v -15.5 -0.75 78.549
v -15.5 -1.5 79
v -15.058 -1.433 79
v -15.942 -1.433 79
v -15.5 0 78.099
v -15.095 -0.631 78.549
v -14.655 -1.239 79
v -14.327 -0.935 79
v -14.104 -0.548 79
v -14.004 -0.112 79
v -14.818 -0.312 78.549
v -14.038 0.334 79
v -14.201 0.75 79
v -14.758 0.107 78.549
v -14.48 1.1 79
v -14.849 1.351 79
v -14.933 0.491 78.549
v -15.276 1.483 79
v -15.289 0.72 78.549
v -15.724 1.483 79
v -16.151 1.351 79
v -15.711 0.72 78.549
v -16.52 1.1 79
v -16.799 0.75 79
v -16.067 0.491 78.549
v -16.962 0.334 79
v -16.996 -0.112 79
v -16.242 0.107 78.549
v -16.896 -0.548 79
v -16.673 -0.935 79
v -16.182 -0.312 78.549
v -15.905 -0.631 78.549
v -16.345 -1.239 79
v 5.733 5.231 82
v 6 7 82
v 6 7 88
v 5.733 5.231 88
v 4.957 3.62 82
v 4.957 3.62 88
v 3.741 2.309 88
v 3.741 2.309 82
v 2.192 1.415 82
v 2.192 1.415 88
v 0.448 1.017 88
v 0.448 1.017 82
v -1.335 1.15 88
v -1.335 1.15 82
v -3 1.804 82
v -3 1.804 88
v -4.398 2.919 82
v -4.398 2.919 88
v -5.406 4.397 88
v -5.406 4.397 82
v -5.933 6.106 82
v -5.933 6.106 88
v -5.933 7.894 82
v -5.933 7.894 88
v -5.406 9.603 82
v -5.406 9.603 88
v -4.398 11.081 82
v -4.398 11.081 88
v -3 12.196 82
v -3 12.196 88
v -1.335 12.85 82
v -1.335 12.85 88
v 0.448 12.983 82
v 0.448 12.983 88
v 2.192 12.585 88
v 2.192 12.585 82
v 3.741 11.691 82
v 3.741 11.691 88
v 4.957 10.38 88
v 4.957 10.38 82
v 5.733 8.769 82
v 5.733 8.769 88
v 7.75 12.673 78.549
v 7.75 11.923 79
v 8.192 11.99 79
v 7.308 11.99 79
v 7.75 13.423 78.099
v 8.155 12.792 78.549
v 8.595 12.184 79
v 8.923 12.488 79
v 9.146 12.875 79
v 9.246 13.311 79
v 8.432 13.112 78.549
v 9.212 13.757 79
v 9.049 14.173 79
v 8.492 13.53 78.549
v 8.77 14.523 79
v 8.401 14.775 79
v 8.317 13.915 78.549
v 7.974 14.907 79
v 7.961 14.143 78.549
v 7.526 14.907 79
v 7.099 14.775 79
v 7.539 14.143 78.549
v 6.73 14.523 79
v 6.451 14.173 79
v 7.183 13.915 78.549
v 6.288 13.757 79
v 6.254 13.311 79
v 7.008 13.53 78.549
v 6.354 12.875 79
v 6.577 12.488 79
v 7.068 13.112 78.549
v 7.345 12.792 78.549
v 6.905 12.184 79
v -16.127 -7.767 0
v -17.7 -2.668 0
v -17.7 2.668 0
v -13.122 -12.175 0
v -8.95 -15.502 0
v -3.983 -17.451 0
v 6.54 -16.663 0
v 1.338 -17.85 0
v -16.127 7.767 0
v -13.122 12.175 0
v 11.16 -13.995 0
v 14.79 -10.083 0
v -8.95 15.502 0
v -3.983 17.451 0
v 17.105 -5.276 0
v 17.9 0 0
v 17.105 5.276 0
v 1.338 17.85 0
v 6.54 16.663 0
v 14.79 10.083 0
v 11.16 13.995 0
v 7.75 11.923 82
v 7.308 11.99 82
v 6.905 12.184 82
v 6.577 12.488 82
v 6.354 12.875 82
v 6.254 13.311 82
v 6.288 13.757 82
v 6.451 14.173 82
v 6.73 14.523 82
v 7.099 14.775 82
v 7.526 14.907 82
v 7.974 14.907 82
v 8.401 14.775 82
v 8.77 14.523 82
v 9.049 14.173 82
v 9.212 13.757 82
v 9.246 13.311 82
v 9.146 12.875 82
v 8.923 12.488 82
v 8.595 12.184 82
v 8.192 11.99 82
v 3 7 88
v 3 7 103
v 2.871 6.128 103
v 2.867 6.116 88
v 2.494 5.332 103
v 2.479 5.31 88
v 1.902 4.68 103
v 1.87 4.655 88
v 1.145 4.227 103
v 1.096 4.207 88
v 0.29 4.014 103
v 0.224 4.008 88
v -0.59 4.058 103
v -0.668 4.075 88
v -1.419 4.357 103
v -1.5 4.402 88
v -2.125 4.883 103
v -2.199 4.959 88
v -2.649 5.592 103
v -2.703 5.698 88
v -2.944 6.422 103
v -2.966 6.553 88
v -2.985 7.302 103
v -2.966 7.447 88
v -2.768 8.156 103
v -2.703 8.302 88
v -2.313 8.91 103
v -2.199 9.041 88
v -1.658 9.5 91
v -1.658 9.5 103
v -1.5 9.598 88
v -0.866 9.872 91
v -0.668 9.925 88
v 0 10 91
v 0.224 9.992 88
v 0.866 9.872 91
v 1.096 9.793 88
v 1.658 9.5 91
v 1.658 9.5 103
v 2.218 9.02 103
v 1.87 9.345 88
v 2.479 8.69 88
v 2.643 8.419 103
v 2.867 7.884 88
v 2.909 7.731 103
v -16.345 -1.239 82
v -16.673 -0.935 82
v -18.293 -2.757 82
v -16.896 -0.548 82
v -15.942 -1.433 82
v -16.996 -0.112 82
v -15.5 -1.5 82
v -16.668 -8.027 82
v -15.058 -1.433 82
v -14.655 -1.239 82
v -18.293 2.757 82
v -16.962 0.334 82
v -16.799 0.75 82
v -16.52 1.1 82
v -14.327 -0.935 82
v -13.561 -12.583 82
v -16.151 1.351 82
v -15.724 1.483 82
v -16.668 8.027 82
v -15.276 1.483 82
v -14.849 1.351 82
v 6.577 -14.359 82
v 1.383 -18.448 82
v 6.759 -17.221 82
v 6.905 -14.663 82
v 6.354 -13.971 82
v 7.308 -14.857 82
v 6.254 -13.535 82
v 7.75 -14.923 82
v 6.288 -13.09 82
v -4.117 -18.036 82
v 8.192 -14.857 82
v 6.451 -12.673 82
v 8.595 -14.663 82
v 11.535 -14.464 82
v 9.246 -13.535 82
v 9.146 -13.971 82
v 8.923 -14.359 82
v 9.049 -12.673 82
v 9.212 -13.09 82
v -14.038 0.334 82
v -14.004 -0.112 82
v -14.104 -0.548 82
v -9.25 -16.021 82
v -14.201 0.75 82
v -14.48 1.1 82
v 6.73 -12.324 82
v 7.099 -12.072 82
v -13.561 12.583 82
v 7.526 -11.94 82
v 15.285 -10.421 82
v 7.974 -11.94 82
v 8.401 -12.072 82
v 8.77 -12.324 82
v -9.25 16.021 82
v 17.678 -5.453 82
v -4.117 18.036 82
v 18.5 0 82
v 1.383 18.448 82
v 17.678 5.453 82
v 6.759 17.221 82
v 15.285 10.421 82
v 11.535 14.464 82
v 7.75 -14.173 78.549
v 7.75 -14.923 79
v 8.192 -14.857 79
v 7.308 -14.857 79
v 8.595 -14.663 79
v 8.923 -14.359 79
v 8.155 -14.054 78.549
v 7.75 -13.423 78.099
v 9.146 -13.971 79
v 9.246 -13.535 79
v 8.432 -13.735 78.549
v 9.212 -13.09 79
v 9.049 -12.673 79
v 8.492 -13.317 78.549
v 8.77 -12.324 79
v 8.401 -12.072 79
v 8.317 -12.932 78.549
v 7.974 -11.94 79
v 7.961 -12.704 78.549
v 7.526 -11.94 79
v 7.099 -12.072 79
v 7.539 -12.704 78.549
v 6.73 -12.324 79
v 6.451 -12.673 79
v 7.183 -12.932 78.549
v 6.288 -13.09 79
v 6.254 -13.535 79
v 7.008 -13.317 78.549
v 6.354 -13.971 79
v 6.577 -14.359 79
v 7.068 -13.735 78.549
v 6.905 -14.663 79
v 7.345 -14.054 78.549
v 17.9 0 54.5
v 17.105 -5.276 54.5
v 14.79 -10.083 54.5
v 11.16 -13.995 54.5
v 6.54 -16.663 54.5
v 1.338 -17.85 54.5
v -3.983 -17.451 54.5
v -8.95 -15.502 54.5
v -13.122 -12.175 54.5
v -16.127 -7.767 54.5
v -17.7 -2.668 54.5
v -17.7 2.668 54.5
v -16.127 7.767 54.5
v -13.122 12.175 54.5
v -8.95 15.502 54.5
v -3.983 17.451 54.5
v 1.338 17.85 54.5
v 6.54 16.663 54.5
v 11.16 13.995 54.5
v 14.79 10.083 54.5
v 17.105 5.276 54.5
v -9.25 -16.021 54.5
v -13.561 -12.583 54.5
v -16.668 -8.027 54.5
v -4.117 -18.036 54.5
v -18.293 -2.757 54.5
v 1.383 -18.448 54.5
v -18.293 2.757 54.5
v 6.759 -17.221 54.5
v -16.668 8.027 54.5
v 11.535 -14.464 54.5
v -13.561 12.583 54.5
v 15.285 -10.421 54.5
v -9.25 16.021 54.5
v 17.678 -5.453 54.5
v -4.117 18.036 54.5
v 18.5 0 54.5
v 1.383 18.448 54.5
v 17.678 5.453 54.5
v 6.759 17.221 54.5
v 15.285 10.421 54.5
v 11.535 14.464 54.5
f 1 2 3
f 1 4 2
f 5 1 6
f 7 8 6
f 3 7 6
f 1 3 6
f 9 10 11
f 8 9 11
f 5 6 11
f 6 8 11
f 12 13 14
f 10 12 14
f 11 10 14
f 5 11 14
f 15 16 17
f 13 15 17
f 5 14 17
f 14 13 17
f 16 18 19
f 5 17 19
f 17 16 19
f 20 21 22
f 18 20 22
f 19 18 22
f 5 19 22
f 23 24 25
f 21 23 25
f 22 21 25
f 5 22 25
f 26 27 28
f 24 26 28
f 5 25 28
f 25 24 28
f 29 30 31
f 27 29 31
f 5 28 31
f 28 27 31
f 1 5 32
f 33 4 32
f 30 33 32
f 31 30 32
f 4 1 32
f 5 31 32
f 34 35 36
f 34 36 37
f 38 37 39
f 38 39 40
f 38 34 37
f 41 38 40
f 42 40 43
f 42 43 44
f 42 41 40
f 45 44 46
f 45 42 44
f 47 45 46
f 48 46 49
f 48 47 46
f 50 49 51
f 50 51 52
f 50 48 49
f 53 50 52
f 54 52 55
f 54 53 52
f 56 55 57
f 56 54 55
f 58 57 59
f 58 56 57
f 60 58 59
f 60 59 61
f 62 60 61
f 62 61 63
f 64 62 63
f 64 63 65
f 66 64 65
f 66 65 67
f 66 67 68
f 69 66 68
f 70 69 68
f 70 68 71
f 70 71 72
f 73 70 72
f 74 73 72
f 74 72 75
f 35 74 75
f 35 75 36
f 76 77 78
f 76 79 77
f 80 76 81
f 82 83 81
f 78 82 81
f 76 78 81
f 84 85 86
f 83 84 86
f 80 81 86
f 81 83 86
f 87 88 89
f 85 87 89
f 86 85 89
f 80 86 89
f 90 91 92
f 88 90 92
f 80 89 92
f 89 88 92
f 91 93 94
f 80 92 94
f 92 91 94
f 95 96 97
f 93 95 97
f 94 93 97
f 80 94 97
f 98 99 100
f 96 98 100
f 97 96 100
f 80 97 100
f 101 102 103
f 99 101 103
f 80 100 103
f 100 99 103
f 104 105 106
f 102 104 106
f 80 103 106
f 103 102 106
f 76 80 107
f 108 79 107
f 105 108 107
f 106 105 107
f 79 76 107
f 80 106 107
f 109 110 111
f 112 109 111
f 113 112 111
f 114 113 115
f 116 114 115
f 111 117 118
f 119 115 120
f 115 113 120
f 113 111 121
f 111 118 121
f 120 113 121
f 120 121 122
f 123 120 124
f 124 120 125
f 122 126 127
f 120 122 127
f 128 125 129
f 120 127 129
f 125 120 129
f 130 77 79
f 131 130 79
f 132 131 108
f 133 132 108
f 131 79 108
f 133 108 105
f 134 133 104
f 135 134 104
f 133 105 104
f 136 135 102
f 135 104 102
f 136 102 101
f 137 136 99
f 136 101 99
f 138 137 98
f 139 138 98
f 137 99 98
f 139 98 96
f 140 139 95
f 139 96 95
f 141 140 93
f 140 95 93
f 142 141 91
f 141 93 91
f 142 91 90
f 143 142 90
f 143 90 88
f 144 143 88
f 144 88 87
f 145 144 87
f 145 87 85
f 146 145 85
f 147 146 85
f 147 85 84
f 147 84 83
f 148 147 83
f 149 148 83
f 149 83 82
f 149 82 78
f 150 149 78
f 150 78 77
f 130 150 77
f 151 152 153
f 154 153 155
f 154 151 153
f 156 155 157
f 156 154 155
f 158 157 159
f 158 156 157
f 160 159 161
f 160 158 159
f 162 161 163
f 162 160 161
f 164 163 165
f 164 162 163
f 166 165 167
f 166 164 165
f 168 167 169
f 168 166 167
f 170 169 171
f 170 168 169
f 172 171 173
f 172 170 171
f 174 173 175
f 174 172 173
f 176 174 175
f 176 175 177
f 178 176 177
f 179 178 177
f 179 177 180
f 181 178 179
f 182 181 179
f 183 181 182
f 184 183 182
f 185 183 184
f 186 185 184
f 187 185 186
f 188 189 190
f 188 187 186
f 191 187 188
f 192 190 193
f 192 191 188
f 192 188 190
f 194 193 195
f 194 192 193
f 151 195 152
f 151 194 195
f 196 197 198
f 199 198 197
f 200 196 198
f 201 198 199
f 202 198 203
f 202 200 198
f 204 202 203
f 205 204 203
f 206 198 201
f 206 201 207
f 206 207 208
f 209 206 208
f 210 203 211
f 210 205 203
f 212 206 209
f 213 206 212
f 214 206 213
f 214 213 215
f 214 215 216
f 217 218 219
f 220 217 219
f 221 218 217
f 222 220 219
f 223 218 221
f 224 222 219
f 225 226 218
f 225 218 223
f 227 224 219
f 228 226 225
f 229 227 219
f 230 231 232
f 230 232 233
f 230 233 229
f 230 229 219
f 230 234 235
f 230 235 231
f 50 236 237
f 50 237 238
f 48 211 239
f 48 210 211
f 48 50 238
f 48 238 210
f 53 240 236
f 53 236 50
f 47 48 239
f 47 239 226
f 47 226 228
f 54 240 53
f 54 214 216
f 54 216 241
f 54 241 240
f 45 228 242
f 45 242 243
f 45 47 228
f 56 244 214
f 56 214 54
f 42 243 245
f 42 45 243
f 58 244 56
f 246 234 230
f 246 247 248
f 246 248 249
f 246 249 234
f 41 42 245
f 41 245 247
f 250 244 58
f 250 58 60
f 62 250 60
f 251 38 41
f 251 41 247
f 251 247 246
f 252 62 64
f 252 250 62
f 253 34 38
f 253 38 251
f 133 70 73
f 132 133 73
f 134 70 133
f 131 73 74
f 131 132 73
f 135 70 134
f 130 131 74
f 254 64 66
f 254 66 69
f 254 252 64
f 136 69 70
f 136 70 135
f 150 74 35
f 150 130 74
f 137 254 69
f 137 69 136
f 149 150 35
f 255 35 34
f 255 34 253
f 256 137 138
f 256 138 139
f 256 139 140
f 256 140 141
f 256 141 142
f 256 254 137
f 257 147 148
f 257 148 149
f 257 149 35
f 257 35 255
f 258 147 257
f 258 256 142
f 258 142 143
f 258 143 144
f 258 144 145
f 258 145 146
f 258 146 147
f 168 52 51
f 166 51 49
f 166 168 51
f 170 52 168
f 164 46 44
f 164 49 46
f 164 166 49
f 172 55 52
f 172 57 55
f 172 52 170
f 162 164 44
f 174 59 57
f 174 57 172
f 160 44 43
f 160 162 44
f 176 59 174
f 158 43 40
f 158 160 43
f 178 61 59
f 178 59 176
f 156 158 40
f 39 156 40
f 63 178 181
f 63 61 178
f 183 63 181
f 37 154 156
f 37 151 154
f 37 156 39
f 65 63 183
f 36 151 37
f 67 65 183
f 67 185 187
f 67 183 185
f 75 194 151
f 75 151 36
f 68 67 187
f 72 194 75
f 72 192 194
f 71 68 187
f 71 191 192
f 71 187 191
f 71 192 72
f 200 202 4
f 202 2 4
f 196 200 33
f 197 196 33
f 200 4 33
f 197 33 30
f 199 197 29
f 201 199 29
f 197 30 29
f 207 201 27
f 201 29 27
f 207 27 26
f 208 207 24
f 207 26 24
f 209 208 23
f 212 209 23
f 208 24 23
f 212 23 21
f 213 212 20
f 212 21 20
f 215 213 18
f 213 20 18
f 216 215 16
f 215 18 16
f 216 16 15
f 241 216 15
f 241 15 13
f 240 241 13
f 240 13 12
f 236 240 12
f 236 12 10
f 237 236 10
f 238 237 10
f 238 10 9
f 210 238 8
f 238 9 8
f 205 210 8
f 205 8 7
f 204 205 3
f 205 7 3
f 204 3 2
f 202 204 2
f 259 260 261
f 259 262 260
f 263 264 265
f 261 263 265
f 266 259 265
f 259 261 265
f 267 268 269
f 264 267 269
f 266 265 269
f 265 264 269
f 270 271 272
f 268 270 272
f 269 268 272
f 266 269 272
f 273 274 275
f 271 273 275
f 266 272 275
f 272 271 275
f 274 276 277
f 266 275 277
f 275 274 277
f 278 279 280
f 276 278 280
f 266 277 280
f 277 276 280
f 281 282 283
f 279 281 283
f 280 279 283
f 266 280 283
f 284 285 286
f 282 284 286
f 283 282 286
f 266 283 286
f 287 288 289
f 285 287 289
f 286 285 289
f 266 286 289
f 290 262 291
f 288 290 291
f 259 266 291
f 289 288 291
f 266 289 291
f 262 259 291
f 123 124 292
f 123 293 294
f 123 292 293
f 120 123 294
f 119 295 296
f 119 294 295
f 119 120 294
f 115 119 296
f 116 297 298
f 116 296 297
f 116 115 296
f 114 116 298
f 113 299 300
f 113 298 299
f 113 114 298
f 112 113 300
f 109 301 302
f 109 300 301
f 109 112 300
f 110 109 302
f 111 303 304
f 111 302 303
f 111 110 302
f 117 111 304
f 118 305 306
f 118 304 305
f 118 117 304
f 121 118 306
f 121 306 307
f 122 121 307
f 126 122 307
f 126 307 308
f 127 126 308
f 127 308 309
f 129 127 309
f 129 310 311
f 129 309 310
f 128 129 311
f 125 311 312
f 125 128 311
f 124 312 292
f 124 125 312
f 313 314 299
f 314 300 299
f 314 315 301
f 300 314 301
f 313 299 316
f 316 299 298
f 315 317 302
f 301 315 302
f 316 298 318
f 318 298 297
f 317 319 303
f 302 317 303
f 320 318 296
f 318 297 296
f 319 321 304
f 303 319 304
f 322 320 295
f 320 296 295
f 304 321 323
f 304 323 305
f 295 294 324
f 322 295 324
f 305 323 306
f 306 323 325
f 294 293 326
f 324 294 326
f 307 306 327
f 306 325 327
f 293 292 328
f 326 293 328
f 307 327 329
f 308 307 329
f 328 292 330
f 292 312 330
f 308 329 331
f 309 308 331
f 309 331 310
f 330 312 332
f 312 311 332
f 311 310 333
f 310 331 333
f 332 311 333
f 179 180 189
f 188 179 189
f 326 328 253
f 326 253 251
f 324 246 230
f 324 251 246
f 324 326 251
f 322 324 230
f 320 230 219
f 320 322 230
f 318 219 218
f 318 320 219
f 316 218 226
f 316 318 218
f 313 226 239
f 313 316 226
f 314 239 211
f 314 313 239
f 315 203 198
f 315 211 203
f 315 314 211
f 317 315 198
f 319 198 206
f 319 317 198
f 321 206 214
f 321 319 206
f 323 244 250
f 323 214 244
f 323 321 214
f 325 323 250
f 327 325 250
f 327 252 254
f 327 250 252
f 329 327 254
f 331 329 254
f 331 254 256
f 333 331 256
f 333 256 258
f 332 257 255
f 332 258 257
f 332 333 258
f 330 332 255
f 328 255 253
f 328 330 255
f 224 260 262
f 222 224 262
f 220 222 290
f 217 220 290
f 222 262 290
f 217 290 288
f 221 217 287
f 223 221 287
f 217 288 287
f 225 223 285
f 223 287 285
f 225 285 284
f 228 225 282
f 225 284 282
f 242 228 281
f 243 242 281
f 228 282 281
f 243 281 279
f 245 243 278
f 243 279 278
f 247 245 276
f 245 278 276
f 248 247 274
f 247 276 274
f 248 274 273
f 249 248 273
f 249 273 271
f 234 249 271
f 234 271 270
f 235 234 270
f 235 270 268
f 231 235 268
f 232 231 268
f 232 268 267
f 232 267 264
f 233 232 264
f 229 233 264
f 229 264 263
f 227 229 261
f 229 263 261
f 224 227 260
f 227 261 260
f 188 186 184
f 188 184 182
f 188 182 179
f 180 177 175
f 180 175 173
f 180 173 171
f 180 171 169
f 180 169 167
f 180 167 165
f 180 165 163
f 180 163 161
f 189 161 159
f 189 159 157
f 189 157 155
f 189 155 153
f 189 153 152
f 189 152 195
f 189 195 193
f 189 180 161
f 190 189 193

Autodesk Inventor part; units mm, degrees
ref_plane "YZ Plane" through (0, 0, 0) normal (1, 0, 0) x (0, 1, 0)
ref_plane "XZ Plane" through (0, 0, 0) normal (0, 1, 0) x (-1, 0, 0)
ref_plane "XY Plane" through (0, 0, 0) normal (0, 0, 1) x (1, 0, 0)
sketch "スケッチ1" plane through (0, 0, 0) normal (0, 0, 1) x (1, 0, 0)
  circle A0 centre (0, 0) radius 17.9
  dimension "d0" = 35.8
extrude "押し出し1" add sketch "スケッチ1" along normal blind 54.5
sketch "スケッチ2" plane through (0, 0, 54.5) normal (0, 0, 1) x (1, 0, 0)
  circle A0 centre (0, 0) radius 17.9 projected
  circle A1 centre (0, 0) radius 18.5
  dimension "d3" = 37
extrude "押し出し2" add sketch "スケッチ2" along normal blind 27.5 contours A0 | A1
sketch "スケッチ3" plane through (0, 0, 82) normal (0, 0, 1) x (1, 0, 0)
  circle A0 centre (0, 0) radius 18.5 projected
  line L0 (0, 0) -> (0, 7)
  circle A1 centre (0, 7) radius 6
  dimension "d6" = 7
  dimension "d7" = 12
extrude "押し出し3" add sketch "スケッチ3" along normal blind 6 contours A1
sketch "スケッチ4" plane through (0, 7, 88) normal (0, 0, 1) x (1, 0, 0)
  circle A0 centre (0, 0) radius 6 projected
  circle A1 centre (0, 0) radius 3
  point P0 (0, -7)
  dimension "d10" = 6
extrude "押し出し4" add sketch "スケッチ4" along normal blind 15 contours A1
sketch "スケッチ5" plane through (0, 7, 103) normal (0, 0, 1) x (1, 0, 0)
  circle A0 centre (0, 0) radius 3 projected
  line L0 (0, -3) -> (0, 2.5)
  line L1 (0, 2.5) -> (1.6583, 2.5)
  line L2 (-1.6583, 2.5) -> (0, 2.5)
  point P0 (0, -7)
  dimension "d13" = 5.5
extrude "押し出し5" cut sketch "スケッチ5" against normal blind 12 contours L1 L2 A0
sketch "スケッチ6" plane through (0, 0, 82) normal (0, 0, 1) x (1, 0, 0)
  circle A0 centre (0, 0) radius 18.5 projected
  circle A1 centre (0, 0) radius 15.5
  circle A2 centre (-15.5, 0) radius 1.5
  line L0 (0, 0) -> (7.75, 13.4234)
  line L1 (0, 0) -> (15.5, 0) construction
  line L2 (0, 0) -> (7.75, -13.4234)
  circle A3 centre (7.75, 13.4234) radius 1.5
  circle A4 centre (7.75, -13.4234) radius 1.5
  dimension "d16" = 31
  dimension "d17" = 3
  dimension "d18" = 60
  dimension "d19" = 3
  dimension "d20" = 3
hole "穴1" at (7.75, 13.4234, 82) at (-15.5, 0, 82) at (7.75, -13.4234, 82) direction (0, 0, -1) diameter 3 depth 3 tip angle 118
thread "ねじ1" size "M3x0.5" class "6H" standard "ANSI Metric M Profile" full length
thread "ねじ2" size "M3x0.5" class "6H" standard "ANSI Metric M Profile" full length
thread "ねじ3" size "M3x0.5" class "6H" standard "ANSI Metric M Profile" full length
properties part number "知能ロボコンタミヤギヤードモータ540" material "鋼、炭素鋼"
